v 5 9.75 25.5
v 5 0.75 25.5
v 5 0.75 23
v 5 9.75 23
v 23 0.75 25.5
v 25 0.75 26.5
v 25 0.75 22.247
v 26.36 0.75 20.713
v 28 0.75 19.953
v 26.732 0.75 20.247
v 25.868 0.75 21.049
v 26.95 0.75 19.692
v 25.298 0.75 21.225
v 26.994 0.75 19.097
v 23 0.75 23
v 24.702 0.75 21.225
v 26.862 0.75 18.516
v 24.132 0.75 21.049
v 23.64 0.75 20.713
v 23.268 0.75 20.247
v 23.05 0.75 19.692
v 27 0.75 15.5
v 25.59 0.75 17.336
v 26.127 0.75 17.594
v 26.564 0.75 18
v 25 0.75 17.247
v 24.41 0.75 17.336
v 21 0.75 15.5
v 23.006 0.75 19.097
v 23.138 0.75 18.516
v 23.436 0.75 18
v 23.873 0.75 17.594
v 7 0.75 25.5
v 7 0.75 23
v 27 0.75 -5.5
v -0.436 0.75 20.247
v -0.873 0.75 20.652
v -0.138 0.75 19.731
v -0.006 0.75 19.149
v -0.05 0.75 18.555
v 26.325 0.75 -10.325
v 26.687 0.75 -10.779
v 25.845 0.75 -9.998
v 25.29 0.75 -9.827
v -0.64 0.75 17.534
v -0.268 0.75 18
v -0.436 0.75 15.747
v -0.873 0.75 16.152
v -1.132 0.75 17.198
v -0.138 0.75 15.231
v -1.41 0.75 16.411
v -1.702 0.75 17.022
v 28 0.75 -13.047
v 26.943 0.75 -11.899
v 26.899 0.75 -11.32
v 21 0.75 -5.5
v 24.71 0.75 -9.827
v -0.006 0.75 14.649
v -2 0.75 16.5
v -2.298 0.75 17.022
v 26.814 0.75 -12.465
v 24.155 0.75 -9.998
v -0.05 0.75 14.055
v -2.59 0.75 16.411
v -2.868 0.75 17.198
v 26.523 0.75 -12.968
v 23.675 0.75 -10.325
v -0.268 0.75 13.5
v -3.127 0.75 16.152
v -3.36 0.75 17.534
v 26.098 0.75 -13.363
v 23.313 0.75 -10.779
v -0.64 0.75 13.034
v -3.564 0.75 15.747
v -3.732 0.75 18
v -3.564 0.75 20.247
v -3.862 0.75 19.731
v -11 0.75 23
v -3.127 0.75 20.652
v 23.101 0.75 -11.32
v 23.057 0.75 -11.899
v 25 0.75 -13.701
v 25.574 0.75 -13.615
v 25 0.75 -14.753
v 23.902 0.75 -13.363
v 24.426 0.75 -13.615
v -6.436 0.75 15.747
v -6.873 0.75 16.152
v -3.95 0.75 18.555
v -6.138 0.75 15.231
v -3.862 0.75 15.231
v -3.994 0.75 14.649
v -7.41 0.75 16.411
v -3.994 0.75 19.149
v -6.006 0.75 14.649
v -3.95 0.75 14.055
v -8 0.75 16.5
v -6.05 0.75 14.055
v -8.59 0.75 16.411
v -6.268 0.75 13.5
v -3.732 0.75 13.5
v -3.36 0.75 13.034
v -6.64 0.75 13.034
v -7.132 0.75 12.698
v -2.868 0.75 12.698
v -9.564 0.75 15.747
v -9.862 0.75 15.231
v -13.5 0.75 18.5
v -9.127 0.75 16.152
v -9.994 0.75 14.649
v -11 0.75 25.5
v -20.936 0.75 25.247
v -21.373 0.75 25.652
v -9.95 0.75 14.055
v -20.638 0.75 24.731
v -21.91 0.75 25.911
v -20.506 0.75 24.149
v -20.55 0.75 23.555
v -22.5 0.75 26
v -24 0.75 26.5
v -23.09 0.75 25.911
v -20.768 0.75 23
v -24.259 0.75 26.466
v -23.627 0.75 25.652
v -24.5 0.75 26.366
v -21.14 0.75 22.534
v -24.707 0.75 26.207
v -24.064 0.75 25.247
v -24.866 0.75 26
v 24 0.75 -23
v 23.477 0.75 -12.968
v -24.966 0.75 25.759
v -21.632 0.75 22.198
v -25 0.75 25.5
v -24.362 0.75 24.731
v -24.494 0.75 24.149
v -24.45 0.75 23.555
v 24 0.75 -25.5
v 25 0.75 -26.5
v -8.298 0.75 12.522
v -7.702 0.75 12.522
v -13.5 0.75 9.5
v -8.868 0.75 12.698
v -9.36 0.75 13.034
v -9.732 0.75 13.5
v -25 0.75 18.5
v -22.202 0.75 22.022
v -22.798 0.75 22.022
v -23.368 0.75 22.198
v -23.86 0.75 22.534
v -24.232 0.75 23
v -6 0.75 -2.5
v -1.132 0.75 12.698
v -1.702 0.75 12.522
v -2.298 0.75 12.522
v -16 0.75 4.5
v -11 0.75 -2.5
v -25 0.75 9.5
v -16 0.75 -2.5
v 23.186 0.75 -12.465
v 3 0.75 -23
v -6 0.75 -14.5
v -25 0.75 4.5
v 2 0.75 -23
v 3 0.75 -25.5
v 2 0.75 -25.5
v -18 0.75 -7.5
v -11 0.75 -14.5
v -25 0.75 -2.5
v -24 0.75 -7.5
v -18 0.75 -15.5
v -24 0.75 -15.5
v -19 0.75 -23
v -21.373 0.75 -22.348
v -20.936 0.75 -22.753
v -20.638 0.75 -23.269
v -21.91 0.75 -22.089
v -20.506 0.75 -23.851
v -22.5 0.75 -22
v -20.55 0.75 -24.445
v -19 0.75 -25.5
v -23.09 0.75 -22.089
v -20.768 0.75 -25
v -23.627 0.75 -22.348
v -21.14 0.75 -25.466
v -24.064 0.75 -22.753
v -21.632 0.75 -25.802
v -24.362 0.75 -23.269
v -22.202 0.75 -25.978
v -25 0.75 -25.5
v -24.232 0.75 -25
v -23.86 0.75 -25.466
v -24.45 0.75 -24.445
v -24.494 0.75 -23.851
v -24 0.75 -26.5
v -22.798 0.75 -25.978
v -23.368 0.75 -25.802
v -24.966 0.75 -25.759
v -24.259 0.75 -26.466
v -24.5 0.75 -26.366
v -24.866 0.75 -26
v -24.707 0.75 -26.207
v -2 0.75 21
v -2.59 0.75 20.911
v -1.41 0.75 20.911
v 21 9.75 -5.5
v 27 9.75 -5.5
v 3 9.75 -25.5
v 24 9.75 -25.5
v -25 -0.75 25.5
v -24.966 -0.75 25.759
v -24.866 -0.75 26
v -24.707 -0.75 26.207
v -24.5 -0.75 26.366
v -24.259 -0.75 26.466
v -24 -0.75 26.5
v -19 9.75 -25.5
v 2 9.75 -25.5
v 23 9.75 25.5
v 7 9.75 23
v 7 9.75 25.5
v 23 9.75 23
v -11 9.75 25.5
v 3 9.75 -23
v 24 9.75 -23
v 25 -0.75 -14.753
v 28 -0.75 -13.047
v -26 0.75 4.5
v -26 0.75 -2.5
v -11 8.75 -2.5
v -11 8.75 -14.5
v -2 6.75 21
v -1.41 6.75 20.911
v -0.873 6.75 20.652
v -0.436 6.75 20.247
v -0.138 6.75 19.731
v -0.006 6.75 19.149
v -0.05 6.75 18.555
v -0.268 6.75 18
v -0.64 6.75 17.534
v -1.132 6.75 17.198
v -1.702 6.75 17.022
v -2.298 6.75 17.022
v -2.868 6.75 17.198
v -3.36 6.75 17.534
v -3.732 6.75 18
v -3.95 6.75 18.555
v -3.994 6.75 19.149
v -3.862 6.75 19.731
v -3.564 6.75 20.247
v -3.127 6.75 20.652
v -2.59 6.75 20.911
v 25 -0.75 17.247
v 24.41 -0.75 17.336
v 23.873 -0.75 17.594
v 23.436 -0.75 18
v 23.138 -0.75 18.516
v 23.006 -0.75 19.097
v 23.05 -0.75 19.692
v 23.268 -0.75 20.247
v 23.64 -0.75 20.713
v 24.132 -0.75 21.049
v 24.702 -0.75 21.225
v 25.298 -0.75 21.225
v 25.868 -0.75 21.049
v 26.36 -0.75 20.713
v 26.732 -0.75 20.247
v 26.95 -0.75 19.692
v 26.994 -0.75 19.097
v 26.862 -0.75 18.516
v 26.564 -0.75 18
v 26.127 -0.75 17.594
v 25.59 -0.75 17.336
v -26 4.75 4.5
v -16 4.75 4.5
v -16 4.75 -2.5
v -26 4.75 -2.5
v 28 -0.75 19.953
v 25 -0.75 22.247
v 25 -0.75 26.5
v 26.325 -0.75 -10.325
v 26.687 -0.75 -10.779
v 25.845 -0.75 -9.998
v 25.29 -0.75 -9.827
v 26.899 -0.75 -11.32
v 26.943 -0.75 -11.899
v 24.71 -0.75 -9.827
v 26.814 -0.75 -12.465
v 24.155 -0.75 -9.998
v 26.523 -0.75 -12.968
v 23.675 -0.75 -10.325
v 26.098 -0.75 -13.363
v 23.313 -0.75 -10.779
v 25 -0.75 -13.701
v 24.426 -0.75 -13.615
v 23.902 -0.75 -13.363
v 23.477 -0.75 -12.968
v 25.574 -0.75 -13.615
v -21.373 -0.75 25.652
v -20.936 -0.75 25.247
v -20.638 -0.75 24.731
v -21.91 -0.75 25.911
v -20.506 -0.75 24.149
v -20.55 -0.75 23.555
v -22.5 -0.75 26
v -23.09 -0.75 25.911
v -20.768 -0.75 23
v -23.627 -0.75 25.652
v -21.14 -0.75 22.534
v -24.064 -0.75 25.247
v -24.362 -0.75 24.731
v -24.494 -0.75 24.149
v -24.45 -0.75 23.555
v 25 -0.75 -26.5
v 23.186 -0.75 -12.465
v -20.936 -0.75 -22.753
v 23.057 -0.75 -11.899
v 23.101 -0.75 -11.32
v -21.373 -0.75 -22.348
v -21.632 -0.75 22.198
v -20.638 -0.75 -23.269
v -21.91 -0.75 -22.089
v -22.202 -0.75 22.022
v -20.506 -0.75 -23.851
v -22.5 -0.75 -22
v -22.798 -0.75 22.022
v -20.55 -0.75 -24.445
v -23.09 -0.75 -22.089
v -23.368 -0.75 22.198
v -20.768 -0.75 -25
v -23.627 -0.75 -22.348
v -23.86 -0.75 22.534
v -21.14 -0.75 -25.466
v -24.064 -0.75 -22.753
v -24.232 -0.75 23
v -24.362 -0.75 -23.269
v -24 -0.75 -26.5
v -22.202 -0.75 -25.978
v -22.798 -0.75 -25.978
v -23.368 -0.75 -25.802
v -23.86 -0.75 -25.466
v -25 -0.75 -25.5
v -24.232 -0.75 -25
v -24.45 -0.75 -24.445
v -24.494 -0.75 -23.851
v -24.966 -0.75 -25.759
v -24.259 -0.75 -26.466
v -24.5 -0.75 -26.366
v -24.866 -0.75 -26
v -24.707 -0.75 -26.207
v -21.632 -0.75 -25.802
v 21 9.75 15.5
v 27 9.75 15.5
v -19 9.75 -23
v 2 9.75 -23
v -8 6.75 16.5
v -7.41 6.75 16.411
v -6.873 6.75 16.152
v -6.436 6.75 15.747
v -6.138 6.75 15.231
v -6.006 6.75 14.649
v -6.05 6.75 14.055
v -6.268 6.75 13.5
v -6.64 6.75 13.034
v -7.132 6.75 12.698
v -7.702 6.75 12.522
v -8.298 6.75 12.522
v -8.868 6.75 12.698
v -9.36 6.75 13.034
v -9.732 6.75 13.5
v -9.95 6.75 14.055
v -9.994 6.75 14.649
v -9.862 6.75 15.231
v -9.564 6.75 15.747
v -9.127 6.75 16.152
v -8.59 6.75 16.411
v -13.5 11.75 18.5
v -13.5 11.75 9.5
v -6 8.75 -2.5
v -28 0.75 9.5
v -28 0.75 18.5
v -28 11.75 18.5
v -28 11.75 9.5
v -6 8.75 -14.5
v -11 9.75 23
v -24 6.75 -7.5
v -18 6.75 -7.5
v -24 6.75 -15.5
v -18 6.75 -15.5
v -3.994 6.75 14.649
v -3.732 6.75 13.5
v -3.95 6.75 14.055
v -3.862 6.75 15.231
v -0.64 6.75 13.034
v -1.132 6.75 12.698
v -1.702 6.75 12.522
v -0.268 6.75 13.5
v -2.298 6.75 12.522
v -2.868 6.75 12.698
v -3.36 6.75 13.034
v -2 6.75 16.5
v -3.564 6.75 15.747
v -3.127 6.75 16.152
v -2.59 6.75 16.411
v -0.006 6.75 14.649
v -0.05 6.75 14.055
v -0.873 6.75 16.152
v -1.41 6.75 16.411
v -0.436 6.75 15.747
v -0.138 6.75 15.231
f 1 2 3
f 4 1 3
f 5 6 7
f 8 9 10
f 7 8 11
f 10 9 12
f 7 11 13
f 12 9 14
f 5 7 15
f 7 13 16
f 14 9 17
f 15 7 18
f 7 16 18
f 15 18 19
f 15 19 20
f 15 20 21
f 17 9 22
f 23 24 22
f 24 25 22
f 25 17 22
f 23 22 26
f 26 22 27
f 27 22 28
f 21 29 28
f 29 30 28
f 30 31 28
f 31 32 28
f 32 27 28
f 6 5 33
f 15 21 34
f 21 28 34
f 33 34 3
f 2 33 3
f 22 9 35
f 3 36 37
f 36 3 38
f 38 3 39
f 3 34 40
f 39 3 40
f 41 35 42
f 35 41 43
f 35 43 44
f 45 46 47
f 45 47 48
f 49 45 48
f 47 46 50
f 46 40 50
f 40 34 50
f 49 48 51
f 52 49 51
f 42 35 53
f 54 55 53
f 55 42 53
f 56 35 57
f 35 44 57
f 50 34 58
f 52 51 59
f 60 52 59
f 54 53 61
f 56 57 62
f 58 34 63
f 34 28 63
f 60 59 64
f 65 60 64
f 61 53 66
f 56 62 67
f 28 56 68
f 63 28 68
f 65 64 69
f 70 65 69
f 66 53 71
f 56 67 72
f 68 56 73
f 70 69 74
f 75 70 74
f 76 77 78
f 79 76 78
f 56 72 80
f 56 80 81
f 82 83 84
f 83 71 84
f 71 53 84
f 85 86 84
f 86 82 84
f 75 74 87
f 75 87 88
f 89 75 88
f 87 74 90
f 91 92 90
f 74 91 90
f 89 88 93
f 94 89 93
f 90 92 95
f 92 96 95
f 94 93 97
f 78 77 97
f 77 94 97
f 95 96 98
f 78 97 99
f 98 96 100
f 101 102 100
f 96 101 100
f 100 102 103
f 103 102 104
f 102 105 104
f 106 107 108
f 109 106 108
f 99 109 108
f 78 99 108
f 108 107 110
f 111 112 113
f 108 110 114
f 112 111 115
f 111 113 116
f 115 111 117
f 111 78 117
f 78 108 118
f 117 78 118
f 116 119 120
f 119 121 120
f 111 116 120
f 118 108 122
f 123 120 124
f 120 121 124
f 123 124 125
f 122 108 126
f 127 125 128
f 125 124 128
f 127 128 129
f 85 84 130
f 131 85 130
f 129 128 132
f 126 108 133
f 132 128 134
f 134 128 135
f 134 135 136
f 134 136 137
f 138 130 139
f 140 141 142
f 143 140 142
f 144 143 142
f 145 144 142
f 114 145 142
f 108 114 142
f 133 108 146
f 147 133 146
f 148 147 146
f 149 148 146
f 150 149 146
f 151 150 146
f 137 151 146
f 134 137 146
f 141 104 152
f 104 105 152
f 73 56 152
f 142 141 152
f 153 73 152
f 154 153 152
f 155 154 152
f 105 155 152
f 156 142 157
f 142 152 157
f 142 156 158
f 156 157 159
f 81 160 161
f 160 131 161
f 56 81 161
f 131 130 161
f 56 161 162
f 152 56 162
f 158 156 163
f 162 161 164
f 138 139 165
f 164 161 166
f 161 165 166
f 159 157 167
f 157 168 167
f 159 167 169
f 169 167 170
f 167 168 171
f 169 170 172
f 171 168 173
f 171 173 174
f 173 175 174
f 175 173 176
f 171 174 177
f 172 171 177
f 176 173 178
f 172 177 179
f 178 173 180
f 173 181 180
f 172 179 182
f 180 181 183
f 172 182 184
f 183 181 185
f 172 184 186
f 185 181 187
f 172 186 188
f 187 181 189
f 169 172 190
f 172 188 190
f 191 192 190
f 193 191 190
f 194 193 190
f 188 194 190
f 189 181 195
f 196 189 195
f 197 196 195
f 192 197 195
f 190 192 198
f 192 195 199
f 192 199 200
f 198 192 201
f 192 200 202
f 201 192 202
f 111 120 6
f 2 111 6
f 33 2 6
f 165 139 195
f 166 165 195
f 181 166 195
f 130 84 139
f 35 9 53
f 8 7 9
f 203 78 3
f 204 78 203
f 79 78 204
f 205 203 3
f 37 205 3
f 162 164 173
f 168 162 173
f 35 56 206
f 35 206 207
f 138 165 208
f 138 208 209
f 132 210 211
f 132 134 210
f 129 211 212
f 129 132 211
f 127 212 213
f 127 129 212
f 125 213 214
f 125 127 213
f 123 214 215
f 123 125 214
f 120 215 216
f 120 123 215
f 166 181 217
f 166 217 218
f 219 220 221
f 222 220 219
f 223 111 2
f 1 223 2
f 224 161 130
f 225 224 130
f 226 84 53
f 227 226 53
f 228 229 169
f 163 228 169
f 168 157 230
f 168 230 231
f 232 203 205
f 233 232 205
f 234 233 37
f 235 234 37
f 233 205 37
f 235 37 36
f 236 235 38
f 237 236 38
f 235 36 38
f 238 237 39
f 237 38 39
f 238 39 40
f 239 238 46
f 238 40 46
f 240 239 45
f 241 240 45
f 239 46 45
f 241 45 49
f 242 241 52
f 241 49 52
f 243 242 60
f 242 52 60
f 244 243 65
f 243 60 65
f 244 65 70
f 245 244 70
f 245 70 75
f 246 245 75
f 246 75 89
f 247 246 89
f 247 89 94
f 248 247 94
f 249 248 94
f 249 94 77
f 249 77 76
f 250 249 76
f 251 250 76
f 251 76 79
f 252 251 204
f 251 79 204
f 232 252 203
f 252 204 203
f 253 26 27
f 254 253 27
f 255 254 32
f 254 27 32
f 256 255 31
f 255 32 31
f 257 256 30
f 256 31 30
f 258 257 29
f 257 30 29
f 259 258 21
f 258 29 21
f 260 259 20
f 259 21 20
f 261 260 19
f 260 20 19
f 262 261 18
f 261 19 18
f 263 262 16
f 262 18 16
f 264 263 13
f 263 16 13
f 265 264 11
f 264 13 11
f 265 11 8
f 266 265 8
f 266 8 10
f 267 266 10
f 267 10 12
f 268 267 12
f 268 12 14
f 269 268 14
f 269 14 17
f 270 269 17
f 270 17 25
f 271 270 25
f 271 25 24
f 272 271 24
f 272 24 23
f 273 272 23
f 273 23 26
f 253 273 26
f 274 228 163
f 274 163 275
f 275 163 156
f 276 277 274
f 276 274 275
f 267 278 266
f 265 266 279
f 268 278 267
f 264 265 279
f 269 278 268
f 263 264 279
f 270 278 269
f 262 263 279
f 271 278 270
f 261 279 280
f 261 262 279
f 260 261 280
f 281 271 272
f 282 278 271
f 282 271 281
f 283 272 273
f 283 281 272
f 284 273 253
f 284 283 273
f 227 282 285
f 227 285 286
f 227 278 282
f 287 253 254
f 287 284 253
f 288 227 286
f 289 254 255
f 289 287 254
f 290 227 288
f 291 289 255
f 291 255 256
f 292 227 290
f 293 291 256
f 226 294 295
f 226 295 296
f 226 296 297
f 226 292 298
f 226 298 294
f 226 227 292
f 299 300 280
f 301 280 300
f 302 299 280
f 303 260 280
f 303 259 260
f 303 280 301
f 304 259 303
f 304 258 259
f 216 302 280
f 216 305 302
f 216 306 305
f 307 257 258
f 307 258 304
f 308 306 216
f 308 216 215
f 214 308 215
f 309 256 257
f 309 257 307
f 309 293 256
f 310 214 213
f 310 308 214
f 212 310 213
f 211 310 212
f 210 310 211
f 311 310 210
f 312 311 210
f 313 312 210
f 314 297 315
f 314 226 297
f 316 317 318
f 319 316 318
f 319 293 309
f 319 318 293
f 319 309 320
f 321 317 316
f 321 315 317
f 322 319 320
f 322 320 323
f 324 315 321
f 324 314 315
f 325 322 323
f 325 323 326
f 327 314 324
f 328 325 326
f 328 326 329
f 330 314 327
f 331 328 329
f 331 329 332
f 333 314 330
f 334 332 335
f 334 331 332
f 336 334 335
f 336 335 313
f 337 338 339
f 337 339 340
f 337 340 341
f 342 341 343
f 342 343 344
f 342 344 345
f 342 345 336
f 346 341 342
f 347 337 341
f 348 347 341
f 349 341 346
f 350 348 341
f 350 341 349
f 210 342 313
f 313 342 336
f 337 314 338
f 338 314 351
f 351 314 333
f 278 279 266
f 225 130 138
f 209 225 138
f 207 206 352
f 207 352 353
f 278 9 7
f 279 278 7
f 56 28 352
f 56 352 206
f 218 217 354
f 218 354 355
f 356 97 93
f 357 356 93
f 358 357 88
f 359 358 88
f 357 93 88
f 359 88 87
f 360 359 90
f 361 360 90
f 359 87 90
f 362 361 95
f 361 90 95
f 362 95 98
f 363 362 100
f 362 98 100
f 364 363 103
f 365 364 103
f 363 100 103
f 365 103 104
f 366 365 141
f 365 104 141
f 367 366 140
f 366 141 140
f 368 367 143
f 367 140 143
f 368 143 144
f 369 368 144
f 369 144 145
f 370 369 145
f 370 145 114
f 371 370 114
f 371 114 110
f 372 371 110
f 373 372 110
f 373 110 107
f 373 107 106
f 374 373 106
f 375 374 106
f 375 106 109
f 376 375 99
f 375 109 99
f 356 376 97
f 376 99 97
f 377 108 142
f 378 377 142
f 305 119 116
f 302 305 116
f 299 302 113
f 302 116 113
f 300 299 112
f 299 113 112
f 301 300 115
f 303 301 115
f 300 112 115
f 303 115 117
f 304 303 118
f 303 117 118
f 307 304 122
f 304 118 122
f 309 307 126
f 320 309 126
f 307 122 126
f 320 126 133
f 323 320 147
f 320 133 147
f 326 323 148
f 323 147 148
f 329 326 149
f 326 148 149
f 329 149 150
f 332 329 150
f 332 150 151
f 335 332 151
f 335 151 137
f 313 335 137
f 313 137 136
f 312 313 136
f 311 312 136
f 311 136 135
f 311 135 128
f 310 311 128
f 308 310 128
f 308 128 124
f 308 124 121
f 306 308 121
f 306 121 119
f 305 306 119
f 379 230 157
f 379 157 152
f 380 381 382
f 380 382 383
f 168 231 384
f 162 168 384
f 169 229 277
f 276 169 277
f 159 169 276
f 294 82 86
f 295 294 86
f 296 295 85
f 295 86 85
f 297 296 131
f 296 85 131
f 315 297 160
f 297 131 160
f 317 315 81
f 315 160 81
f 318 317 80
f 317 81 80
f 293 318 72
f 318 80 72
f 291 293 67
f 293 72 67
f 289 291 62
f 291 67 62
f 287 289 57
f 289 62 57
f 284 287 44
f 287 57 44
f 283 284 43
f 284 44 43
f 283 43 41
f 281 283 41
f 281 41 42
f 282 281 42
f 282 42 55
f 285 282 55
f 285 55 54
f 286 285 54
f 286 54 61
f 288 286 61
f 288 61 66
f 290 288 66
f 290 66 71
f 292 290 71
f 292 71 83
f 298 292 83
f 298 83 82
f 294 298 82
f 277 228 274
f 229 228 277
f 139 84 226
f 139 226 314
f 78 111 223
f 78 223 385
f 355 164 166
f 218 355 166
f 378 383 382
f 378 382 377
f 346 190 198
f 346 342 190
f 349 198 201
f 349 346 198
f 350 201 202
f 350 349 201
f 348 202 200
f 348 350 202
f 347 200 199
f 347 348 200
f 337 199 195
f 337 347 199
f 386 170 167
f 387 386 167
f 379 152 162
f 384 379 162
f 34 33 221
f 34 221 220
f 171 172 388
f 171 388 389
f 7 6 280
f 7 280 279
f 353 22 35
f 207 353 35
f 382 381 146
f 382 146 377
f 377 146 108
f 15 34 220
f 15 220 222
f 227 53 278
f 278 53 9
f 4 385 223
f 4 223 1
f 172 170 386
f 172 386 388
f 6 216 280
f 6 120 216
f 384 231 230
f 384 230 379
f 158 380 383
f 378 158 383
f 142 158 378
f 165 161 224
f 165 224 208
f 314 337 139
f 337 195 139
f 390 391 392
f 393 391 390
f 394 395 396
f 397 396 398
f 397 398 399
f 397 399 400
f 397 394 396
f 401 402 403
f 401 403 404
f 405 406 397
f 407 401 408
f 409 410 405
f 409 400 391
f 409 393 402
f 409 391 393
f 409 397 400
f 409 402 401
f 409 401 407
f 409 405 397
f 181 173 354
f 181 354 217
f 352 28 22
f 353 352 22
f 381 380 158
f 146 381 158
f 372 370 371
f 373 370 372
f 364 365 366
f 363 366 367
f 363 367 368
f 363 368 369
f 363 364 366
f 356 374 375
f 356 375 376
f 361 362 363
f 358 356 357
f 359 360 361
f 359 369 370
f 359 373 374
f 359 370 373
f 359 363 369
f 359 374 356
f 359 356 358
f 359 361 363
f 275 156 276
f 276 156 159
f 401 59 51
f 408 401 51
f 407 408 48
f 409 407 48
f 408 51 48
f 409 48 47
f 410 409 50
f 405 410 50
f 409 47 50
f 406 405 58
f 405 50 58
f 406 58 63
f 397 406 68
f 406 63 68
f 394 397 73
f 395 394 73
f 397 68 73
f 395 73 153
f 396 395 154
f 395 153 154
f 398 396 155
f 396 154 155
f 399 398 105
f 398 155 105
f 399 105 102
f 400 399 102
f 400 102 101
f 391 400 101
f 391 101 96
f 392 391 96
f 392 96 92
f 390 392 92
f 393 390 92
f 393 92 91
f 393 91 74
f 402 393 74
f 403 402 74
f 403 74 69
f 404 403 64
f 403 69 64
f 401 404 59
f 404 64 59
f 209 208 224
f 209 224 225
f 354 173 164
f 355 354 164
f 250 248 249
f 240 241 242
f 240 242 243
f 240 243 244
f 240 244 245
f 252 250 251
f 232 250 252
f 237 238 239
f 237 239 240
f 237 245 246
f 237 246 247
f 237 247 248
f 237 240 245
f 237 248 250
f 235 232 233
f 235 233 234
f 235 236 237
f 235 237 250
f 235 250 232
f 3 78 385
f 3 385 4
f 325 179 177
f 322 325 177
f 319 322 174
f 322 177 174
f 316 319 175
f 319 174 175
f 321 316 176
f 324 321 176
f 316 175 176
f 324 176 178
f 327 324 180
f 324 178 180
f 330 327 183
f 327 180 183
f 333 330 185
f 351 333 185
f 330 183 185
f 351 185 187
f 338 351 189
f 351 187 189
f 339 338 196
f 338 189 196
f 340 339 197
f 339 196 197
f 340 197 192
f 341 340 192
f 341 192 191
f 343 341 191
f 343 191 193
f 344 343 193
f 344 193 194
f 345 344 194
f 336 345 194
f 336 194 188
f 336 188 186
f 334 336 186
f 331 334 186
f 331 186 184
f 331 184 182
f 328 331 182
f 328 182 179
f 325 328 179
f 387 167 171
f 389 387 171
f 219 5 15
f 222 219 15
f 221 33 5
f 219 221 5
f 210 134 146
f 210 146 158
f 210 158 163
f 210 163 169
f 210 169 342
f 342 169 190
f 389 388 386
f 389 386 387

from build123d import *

# Parameters (mm, degrees)
SKETCH1_W           = 50
SKETCH1_H           = 53
BOSS_EXTRUDE1_DEPTH = 0.75
BOSS_EXTRUDE2_DEPTH = 1.5
SKETCH7_R           = 2
SKETCH7_R_2         = 1.948313055
CUT_EXTRUDE1_DEPTH  = 39.581083448
SKETCH8_W           = 21
SKETCH8_H           = 2.5
SKETCH8_W_2         = 6
SKETCH8_H_2         = 21
SKETCH8_W_3         = 16
BOSS_EXTRUDE3_DEPTH = 9
SKETCH9_R           = 2
BOSS_EXTRUDE4_DEPTH = 6
SKETCH10_W          = 14.5
SKETCH10_H          = 9
BOSS_EXTRUDE5_DEPTH = 11
SKETCH11_W          = 10
SKETCH11_H          = 7
BOSS_EXTRUDE6_DEPTH = 4
SKETCH12_W          = 6
SKETCH12_H          = 8
BOSS_EXTRUDE7_DEPTH = 6
SKETCH13_W          = 5
SKETCH13_H          = 12
BOSS_EXTRUDE8_DEPTH = 8
FILLET4_R           = 1
FILLET5_R           = 1


with BuildPart() as part:
    # Sketch1 → Boss-Extrude1 (new, symmetric)
    with BuildSketch(Plane(origin=(0, 0, 0), x_dir=(1, 0, 0), z_dir=(0, 1, 0))):
        Rectangle(SKETCH1_W, SKETCH1_H)
    extrude(amount=BOSS_EXTRUDE1_DEPTH, both=True)


with BuildPart() as body_2:
    # Sketch3 → Boss-Extrude2 (new body)
    with BuildSketch(Plane(origin=(0, 0.75, 0), x_dir=(1, 0, 0), z_dir=(0, 1, 0))):
        Polygon((25, -22.246887694), (25, 14.753112306), (28, 13.047029226), (28, -19.952970774), align=None)
    extrude(amount=-BOSS_EXTRUDE2_DEPTH)


with BuildPart() as cut_extrude1_tool:
    # Sketch7 → Cut-Extrude1 (new, through all)
    with BuildSketch(Plane(origin=(0, 0.75, 0), x_dir=(1, 0, 0), z_dir=(0, 1, 0))):
        with Locations(Location((-22.5, 24, 0), (0, 0, 270))):
            Circle(SKETCH7_R)
        with Locations(Location((-22.5, -24, 0), (0, 0, 270))):
            Circle(SKETCH7_R)
        with Locations((25, 11.753112306)):
            Circle(SKETCH7_R_2)
        with Locations((25, -19.246887694)):
            Circle(SKETCH7_R)
    extrude(amount=-CUT_EXTRUDE1_DEPTH)


with BuildPart() as part_1:
    add(part.part)

    # Cut-Extrude1: cut by cut_extrude1_tool
    add(cut_extrude1_tool.part, mode=Mode.SUBTRACT)



with BuildPart() as body_2_1:
    add(body_2.part)

    # Cut-Extrude1: cut by cut_extrude1_tool
    add(cut_extrude1_tool.part, mode=Mode.SUBTRACT)


with BuildPart() as part_2:
    add(part_1.part)

    add(body_2_1.part)  # Boss-Extrude3 merges body 2
    # Sketch8 → Boss-Extrude3 (add)
    with BuildSketch(Plane(origin=(0, 0.75, 0), x_dir=(1, 0, 0), z_dir=(0, 1, 0))):
        with Locations((13.5, 24.25)):
            Rectangle(SKETCH8_W, SKETCH8_H)
        with Locations((-8.5, 24.25)):
            Rectangle(SKETCH8_W, SKETCH8_H)
        with Locations((24, -5)):
            Rectangle(SKETCH8_W_2, SKETCH8_H_2)
        with Locations((15, -24.25)):
            Rectangle(SKETCH8_W_3, SKETCH8_H)
        with Locations((-3, -24.25)):
            Rectangle(SKETCH8_W_3, SKETCH8_H)
    extrude(amount=BOSS_EXTRUDE3_DEPTH)

    # Sketch9 → Boss-Extrude4 (add)
    with BuildSketch(Plane(origin=(0, 0.75, 0), x_dir=(1, 0, 0), z_dir=(0, 1, 0))):
        with Locations(Location((-2, -19, 0), (0, 0, 270))):
            Circle(SKETCH9_R)
        with Locations(Location((-2, -14.5, 0), (0, 0, 270))):
            Circle(SKETCH9_R)
        with Locations(Location((-8, -14.5, 0), (0, 0, 270))):
            Circle(SKETCH9_R)
    extrude(amount=BOSS_EXTRUDE4_DEPTH)

    # Sketch10 → Boss-Extrude5 (add)
    with BuildSketch(Plane(origin=(0, 0.75, 0), x_dir=(1, 0, 0), z_dir=(0, 1, 0))):
        with Locations((-20.75, -14)):
            Rectangle(SKETCH10_W, SKETCH10_H)
    extrude(amount=BOSS_EXTRUDE5_DEPTH)

    # Sketch11 → Boss-Extrude6 (add)
    with BuildSketch(Plane(origin=(0, 0.75, 0), x_dir=(1, 0, 0), z_dir=(0, 1, 0))):
        with Locations((-21, -1)):
            Rectangle(SKETCH11_W, SKETCH11_H)
    extrude(amount=BOSS_EXTRUDE6_DEPTH)

    # Sketch12 → Boss-Extrude7 (add)
    with BuildSketch(Plane(origin=(0, 0.75, 0), x_dir=(1, 0, 0), z_dir=(0, 1, 0))):
        with Locations((-21, 11.5)):
            Rectangle(SKETCH12_W, SKETCH12_H)
    extrude(amount=BOSS_EXTRUDE7_DEPTH)

    # Sketch13 → Boss-Extrude8 (add)
    with BuildSketch(Plane(origin=(0, 0.75, 0), x_dir=(1, 0, 0), z_dir=(0, 1, 0))):
        with Locations((-8.5, 8.5)):
            Rectangle(SKETCH13_W, SKETCH13_H)
    extrude(amount=BOSS_EXTRUDE8_DEPTH)

    # Fillet4
    fillet4_edges = [part_2.edges().sort_by_distance(p)[0] for p in [
        (-25, 0, -26.5),
    ]]
    fillet(fillet4_edges, radius=FILLET4_R)

    # Fillet5
    fillet5_edges = [part_2.edges().sort_by_distance(p)[0] for p in [
        (-25, 0, 26.5),
    ]]
    fillet(fillet5_edges, radius=FILLET5_R)


solid = part_2.part
